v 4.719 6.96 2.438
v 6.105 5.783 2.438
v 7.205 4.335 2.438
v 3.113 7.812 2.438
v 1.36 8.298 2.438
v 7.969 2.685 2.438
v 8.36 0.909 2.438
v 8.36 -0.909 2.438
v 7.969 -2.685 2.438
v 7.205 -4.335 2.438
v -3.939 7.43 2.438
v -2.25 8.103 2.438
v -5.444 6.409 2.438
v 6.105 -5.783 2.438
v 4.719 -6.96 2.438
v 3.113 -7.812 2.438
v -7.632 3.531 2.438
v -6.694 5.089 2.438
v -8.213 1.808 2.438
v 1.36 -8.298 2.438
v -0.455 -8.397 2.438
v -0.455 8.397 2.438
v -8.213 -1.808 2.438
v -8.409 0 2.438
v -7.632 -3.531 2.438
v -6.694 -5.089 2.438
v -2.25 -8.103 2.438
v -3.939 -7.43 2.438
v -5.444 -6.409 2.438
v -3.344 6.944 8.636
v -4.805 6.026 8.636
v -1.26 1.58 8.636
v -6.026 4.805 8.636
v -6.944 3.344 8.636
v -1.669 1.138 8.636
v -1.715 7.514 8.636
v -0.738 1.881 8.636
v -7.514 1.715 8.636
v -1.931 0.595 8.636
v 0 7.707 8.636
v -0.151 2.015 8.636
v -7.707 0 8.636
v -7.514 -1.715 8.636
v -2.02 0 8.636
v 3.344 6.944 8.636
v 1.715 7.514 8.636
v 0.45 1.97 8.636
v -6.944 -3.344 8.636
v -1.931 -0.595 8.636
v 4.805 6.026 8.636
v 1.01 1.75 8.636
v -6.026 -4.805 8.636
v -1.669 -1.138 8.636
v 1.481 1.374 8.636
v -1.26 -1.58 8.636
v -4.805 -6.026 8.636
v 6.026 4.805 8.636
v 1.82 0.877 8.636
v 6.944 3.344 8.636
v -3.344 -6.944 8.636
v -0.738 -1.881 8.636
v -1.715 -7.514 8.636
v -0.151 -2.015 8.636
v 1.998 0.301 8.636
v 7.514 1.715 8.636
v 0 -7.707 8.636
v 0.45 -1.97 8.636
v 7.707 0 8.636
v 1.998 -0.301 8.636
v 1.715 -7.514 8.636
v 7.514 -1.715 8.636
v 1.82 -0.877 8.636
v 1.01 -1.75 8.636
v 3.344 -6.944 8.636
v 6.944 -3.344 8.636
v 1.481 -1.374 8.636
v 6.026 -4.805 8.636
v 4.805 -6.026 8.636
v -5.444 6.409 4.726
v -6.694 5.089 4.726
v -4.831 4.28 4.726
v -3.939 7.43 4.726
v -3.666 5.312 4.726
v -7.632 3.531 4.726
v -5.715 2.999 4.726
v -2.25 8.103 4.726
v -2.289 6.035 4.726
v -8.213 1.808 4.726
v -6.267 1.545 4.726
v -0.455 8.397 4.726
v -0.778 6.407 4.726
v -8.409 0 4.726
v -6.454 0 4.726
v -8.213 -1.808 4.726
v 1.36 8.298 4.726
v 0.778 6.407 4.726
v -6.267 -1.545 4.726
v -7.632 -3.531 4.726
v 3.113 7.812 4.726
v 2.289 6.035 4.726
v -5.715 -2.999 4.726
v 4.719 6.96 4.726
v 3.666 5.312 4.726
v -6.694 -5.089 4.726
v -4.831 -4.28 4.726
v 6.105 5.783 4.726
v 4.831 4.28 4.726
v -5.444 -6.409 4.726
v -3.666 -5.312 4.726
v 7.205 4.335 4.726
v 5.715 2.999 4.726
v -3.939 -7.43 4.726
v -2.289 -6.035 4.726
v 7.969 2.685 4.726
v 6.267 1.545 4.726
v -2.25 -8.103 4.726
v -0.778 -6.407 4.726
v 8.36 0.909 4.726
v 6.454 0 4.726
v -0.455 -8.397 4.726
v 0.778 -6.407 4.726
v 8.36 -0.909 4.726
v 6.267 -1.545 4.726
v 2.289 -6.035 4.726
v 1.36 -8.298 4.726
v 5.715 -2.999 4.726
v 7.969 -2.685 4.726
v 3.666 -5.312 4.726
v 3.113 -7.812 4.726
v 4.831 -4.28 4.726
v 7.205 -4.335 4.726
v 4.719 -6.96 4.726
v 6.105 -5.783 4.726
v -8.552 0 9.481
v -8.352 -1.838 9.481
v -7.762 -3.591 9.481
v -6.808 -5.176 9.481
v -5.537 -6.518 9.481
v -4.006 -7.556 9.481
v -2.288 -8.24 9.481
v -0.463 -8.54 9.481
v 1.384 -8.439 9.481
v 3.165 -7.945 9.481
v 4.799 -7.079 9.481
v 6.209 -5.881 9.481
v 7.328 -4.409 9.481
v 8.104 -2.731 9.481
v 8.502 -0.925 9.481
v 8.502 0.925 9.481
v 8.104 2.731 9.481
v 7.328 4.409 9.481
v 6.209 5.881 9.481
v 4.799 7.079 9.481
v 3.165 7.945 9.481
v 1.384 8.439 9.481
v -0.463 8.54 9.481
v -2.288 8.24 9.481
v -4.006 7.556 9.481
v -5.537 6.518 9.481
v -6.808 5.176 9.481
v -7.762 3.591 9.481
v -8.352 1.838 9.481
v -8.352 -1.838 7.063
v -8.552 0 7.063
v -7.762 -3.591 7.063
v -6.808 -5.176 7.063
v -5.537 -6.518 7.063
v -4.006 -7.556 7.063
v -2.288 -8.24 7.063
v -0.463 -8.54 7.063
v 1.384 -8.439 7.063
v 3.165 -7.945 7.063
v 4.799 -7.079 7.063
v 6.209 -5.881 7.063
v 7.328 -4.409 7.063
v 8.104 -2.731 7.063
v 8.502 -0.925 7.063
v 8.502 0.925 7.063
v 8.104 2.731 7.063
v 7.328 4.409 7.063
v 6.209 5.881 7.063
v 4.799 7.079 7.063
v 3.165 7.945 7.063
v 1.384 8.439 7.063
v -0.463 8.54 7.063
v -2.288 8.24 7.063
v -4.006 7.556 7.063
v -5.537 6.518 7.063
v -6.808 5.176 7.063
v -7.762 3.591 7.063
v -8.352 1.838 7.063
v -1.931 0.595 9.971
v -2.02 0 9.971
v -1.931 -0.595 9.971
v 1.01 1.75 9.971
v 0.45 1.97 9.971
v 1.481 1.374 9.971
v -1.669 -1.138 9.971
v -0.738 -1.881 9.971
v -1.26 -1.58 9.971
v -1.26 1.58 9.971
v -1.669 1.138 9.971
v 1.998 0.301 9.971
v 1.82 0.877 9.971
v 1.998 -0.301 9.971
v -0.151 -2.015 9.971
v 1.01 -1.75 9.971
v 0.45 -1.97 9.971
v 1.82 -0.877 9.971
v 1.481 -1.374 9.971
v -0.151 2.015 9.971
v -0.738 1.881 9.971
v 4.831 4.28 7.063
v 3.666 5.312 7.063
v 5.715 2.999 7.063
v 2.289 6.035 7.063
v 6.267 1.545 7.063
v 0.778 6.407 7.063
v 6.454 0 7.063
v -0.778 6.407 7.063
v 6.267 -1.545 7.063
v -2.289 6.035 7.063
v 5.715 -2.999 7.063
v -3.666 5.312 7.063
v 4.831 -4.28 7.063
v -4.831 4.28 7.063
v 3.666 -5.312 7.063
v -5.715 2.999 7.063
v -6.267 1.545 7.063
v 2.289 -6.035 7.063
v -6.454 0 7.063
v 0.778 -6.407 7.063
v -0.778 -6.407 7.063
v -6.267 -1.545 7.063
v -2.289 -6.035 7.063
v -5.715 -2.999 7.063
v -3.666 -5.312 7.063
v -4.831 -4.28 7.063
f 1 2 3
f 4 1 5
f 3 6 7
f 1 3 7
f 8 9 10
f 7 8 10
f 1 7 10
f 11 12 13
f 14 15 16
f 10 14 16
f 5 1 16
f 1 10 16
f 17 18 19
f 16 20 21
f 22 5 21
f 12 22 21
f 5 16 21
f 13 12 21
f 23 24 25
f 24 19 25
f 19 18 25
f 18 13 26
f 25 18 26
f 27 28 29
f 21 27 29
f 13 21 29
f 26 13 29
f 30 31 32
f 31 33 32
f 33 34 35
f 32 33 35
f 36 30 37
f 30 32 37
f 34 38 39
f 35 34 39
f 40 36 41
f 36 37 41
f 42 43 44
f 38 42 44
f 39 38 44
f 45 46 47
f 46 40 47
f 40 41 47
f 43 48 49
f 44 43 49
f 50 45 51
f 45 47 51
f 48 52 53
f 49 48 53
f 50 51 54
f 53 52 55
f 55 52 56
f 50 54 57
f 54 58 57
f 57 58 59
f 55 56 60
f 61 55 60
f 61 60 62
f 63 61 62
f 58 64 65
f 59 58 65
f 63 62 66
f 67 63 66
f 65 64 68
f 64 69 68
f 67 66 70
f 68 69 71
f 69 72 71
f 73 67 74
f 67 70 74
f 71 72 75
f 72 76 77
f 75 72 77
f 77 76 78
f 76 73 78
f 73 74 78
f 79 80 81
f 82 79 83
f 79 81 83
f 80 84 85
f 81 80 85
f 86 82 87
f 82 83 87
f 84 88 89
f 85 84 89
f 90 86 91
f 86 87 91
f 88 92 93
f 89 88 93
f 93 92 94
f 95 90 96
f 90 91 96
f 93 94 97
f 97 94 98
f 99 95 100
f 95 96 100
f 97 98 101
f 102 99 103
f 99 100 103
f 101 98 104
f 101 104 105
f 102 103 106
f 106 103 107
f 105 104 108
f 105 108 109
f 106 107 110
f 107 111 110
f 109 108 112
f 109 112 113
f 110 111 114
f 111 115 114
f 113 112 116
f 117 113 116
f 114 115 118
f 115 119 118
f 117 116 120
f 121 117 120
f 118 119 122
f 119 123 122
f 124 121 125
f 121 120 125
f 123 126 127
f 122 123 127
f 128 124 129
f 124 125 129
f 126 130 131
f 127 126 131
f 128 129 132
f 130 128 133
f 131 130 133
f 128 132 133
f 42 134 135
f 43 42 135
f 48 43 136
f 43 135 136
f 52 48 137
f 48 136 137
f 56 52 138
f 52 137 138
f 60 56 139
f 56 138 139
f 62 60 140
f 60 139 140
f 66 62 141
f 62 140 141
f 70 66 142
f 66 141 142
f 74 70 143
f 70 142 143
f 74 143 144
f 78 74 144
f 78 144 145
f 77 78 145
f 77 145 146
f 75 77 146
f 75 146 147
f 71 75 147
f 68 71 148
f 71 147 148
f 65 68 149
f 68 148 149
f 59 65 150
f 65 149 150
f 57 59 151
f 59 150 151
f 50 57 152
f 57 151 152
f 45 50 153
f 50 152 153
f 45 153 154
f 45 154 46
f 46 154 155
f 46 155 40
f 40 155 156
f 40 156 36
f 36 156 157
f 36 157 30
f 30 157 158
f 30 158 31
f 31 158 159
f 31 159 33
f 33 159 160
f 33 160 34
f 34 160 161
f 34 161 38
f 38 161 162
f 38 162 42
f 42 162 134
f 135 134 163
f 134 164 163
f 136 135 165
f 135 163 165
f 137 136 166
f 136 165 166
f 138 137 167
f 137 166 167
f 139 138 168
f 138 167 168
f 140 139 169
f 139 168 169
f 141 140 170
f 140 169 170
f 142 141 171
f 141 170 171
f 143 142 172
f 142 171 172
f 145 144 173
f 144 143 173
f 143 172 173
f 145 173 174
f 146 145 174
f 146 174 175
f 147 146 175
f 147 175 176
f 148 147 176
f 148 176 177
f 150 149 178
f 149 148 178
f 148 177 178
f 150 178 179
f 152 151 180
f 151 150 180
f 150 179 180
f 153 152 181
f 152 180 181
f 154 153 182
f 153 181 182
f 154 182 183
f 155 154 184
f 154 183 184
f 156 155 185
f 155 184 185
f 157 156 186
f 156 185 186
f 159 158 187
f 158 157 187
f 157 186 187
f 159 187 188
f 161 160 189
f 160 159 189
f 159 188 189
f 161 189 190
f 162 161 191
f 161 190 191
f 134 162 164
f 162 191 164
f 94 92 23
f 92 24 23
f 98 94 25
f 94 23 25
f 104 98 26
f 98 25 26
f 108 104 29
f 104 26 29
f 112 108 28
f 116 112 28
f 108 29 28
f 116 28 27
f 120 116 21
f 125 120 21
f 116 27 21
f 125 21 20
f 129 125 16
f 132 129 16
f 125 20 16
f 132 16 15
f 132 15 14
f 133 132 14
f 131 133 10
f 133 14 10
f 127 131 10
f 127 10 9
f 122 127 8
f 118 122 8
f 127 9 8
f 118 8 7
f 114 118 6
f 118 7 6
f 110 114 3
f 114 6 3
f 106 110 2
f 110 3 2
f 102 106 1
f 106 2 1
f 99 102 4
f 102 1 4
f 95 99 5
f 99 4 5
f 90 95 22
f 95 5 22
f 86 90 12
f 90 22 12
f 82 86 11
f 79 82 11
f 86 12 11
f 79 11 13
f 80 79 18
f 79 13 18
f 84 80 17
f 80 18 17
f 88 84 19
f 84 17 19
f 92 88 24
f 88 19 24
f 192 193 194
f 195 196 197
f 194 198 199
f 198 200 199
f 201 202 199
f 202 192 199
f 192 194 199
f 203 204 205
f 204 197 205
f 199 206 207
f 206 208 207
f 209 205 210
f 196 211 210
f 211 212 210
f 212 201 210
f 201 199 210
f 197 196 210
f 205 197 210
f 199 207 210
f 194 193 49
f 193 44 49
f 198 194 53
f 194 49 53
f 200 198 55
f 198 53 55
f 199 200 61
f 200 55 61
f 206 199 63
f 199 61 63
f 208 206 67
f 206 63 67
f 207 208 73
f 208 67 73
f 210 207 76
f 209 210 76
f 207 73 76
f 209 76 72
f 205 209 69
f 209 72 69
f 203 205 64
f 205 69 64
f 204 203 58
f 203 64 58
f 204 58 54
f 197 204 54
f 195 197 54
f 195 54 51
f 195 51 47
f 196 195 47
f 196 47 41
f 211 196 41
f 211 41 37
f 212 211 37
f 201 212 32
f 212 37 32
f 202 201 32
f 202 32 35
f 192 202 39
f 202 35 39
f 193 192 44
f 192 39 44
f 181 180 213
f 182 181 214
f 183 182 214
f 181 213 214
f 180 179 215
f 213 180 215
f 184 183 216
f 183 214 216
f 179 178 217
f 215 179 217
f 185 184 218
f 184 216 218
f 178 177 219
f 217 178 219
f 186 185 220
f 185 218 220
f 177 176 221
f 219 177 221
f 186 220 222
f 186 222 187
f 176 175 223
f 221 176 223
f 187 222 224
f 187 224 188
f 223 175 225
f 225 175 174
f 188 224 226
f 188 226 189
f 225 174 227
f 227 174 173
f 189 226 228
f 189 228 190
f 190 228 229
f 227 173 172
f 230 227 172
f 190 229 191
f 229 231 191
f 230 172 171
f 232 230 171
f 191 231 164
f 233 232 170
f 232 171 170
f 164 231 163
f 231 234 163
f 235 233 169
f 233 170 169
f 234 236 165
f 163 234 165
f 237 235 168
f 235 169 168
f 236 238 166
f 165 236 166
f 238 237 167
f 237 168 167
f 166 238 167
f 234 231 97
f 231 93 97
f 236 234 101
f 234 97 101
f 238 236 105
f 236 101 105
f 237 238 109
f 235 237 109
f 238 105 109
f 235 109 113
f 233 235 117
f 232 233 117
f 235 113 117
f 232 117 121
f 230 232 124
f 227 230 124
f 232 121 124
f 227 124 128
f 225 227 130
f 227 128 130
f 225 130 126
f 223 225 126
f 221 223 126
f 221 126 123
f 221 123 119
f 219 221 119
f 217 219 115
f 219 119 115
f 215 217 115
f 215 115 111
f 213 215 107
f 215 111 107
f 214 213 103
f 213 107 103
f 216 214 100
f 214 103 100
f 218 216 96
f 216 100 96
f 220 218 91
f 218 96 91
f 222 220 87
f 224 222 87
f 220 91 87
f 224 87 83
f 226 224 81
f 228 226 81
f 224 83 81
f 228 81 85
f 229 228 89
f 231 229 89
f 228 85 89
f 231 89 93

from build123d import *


# Not quite as in the source:
# - a fillet or chamfer that OpenCascade refuses, or shapes differently, is made with other operations: its cross-section is extruded or revolved along the edge and cut away or added


with BuildPart() as f1:
    # F0 (on Front) → F1 (revolve)
    with BuildSketch(Plane.XZ):
        Polygon((0, 2.4378150702), (0, 2.7715591714), (0, 9.970895946), (-2.0202985033, 9.970895946), (-2.0202985033, 8.6359195411), (-6.4543271437, 8.6359195411), (-6.4543271437, 9.9232187495), (-8.5521470755, 9.9232187495), (-8.5521470755, 7.0625548251), (-6.4543271437, 7.0625548251), (-6.4543271437, 4.7263461165), (-8.4091145545, 4.7263461165), (-8.4091145545, 2.4378150702), align=None)
    revolve(axis=Axis((0, 0, 6.3712275587), (0, 0, 1)))

    # F2: chamfer of 2.54 on 1 edges, made by hand


with BuildPart() as f2_tool2:
    # F2_s3 → F2_t4 (revolve)
    with BuildSketch(Plane.XZ):
        Polygon((-6.4543271437, 7.3832187495), (-8.9943271437, 9.9232187495), (-6.4543271437, 9.9232187495), align=None)
    revolve(axis=Axis((0, 0, 9.9232187495), (0, 0, 1)))

    split(bisect_by=Plane.XY.offset(8.6359195411), keep=Keep.TOP)


with BuildPart() as f1_1:
    add(f1.part)

    # F2_t1: cut F2_tool2
    add(f2_tool2.part, mode=Mode.SUBTRACT)


solid = f1_1.part
